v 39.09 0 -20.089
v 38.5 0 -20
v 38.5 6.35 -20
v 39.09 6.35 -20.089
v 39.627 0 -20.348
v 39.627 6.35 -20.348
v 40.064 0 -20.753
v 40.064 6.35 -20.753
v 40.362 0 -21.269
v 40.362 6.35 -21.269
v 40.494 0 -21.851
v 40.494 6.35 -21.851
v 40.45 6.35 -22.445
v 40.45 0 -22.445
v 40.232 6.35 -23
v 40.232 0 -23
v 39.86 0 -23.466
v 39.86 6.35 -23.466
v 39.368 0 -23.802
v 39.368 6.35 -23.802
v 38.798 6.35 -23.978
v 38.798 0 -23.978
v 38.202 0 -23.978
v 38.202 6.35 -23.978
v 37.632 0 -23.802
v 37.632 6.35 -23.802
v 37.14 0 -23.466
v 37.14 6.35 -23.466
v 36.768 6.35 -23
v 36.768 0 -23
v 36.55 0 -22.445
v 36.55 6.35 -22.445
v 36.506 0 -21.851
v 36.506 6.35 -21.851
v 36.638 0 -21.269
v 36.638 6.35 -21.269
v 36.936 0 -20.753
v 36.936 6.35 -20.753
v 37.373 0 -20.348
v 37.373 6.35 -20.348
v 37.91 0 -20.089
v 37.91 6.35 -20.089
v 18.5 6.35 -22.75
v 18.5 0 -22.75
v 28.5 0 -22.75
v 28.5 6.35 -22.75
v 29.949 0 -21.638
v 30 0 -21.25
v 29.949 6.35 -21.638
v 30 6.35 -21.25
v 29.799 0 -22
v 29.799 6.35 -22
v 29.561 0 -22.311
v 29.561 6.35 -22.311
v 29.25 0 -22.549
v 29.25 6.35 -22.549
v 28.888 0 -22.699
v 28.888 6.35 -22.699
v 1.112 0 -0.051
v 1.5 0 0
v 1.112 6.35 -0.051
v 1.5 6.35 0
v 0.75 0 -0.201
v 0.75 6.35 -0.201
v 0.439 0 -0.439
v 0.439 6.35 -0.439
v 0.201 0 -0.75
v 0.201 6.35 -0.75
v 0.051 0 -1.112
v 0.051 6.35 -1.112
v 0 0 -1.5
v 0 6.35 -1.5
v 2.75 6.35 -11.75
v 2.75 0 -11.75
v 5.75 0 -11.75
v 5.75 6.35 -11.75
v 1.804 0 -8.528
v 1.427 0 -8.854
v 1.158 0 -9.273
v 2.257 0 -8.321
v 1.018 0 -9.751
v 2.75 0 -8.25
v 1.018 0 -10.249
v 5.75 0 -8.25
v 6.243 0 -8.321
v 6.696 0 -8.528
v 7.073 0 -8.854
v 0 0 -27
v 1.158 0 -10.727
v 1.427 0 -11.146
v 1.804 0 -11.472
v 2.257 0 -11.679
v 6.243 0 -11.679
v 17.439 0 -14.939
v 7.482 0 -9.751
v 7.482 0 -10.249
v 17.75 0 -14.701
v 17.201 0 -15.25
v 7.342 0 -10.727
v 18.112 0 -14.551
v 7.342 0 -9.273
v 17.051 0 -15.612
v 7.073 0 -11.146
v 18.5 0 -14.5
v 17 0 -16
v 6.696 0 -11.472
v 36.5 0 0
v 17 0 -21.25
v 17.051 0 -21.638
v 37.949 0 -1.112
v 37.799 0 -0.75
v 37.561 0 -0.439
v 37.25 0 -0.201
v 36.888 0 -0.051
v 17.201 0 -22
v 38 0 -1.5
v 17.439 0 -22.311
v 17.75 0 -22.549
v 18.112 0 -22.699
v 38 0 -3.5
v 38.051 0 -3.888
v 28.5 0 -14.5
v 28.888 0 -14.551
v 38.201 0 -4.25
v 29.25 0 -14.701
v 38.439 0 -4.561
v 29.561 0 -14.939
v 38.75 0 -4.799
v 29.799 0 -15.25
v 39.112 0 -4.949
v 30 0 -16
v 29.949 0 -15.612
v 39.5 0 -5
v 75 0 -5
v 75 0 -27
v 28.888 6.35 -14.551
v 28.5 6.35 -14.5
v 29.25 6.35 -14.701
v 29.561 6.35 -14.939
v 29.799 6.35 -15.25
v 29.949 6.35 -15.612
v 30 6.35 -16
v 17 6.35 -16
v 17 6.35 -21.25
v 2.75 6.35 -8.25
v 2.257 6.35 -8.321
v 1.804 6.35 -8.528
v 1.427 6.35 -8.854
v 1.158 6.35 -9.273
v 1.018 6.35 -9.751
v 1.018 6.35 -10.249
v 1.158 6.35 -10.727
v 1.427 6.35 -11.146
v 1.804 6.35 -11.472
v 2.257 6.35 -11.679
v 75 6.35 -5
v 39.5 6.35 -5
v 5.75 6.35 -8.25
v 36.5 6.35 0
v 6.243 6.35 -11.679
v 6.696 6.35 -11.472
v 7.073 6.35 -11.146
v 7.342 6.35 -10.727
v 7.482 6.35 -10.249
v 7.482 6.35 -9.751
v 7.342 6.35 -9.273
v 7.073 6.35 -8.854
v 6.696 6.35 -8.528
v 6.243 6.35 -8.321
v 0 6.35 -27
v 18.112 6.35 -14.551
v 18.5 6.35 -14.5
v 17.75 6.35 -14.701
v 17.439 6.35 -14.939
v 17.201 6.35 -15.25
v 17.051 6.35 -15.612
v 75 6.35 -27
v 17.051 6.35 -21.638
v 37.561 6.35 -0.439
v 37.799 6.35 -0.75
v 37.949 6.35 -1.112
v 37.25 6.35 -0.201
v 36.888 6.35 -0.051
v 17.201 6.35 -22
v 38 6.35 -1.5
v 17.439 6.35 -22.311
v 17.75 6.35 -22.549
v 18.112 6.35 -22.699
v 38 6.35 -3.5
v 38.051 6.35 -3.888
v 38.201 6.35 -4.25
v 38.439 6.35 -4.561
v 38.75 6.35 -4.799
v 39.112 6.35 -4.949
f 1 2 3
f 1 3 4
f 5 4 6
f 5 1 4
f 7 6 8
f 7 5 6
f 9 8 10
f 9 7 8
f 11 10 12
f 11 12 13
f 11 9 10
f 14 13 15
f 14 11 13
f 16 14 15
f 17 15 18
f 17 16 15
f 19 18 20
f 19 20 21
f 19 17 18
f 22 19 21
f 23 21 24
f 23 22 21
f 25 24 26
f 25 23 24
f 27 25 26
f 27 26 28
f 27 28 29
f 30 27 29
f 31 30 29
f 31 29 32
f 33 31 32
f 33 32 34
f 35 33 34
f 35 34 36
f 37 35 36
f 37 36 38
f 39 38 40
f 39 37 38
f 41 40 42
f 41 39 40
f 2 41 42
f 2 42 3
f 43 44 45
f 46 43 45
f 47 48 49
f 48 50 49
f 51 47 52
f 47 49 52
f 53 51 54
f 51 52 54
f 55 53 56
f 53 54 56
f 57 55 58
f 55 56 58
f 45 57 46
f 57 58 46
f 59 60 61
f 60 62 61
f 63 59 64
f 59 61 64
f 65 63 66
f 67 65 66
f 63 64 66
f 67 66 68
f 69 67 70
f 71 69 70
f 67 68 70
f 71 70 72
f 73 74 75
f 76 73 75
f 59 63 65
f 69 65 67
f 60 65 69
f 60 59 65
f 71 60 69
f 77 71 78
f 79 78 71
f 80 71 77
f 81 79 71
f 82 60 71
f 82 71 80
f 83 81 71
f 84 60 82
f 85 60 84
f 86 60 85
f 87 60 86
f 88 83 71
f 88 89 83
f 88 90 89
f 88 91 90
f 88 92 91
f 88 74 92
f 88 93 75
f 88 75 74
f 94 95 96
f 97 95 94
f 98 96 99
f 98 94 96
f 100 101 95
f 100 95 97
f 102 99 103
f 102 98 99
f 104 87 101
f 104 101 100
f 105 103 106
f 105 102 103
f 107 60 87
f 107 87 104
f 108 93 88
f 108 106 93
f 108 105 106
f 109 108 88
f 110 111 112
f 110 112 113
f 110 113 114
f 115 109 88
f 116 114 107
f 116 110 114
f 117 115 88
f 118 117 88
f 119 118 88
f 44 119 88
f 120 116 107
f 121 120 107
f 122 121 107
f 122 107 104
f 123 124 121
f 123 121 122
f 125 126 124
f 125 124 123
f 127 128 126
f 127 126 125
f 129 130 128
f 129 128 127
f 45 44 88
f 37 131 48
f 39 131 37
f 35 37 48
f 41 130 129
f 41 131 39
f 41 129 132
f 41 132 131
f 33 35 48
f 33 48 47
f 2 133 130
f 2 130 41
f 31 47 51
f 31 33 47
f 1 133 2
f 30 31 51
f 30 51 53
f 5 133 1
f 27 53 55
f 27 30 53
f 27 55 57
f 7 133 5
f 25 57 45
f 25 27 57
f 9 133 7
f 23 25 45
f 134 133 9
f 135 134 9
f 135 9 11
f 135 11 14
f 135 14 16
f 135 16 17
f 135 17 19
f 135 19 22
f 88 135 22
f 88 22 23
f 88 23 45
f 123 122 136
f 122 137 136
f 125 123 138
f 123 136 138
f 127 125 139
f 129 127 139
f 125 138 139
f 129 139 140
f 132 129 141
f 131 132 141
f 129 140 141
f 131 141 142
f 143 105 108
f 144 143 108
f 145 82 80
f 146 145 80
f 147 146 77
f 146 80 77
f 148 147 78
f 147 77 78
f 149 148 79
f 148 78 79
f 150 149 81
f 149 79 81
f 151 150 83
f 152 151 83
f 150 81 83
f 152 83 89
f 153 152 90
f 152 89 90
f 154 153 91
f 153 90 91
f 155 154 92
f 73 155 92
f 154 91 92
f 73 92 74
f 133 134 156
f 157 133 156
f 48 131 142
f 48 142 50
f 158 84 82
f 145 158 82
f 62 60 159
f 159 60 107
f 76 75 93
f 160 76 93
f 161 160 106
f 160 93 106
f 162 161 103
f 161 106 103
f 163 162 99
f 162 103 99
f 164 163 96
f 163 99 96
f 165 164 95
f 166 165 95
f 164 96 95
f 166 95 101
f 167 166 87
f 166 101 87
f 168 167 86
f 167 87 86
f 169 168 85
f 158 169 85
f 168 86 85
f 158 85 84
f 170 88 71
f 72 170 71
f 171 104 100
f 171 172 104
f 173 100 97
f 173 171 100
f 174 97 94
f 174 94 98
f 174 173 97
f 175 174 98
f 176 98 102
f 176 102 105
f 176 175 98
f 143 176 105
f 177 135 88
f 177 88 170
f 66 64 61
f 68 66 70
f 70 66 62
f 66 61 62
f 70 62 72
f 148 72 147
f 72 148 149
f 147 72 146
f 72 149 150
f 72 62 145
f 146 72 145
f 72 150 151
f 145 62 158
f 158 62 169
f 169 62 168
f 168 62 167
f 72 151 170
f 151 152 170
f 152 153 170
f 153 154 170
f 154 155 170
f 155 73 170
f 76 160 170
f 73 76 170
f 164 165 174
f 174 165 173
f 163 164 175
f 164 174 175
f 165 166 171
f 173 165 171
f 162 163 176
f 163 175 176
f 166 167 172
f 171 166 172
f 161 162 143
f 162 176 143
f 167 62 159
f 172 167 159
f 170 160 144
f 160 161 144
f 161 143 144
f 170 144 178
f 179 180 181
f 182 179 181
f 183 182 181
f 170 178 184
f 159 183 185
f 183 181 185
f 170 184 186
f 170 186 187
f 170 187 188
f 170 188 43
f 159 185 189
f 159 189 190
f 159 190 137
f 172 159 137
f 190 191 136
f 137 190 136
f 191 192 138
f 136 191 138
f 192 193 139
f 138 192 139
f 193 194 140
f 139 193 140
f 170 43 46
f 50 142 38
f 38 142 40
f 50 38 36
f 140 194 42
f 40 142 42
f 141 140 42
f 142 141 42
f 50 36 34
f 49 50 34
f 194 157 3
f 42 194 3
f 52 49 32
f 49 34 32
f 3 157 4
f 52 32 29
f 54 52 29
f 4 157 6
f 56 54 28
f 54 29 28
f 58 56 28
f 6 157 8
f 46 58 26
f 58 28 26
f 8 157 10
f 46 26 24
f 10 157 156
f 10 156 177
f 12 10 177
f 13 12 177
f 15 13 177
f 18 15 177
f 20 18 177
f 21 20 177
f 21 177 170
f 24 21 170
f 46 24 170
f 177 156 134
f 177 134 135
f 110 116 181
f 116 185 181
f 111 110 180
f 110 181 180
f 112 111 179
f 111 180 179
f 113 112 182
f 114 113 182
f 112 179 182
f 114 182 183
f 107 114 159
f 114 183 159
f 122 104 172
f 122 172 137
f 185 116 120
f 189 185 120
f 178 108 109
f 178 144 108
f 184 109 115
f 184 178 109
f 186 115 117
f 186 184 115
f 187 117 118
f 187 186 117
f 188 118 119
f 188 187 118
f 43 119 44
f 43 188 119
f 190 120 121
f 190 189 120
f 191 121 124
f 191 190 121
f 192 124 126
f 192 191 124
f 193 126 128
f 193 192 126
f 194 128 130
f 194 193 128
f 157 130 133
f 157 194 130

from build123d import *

# Parameters (mm, degrees)
SKETCH1_R           = 2
SKETCH1_R_2         = 3
SKETCH1_W           = 13
SKETCH1_H           = 8.25
BOSS_EXTRUDE1_DEPTH = 6.35
FILLET1_R           = 1.5
SKETCH2_W           = 82.327825706
SKETCH2_H           = 14.458254131
CUT_EXTRUDE1_DEPTH  = 51
SKETCH3_W           = 51.5
SKETCH3_H           = 6.35
BOSS_EXTRUDE2_DEPTH = 25
SKETCH4_W           = 84.929028447
SKETCH4_H           = 25.885902506
CUT_EXTRUDE2_DEPTH  = 90
SKETCH5_W           = 0.1
SKETCH5_H           = 6.35
CUT_EXTRUDE3_DEPTH  = 90
SKETCH6_W           = 81.24526446
SKETCH6_H           = 21.013173112
CUT_EXTRUDE4_DEPTH  = 71


with BuildPart() as part:
    # Sketch1 → Boss-Extrude1 (new body)
    with BuildSketch(Plane(origin=(0, 0, 0), x_dir=(1, 0, 0), z_dir=(0, 1, 0))):
        Polygon((38, 0), (38, 5), (58, 5), (58, 0), (96, 0), (96, 48.5), (89, 58.5), (89, 67.5), (62, 67.5), (62, 56.5), (34, 56.5), (34, 67.5), (7, 67.5), (7, 58.5), (0, 48.5), (0, 0), align=None)
        with Locations(Location((38.5, 40, 0), (0, 0, 270))):
            Circle(SKETCH1_R, mode=Mode.SUBTRACT)
        with Locations(Location((38.5, 22, 0), (0, 0, 270))):
            Circle(SKETCH1_R, mode=Mode.SUBTRACT)
        with Locations(Location((57.5, 22, 0), (0, 0, 90))):
            Circle(SKETCH1_R, mode=Mode.SUBTRACT)
        with Locations(Location((57.5, 40, 0), (0, 0, 90))):
            Circle(SKETCH1_R, mode=Mode.SUBTRACT)
        with Locations(Location((12.5, 61.75, 0), (0, 0, 270))):
            Circle(SKETCH1_R_2, mode=Mode.SUBTRACT)
        with Locations(Location((28, 61.75, 0), (0, 0, 270))):
            Circle(SKETCH1_R_2, mode=Mode.SUBTRACT)
        with Locations(Location((68, 61.75, 0), (0, 0, 90))):
            Circle(SKETCH1_R_2, mode=Mode.SUBTRACT)
        with Locations(Location((83.5, 61.75, 0), (0, 0, 90))):
            Circle(SKETCH1_R_2, mode=Mode.SUBTRACT)
        with Locations((72.5, 18.625)):
            Rectangle(SKETCH1_W, SKETCH1_H, mode=Mode.SUBTRACT)
        with Locations((23.5, 34.875)):
            Rectangle(SKETCH1_W, SKETCH1_H, mode=Mode.SUBTRACT)
        with Locations((23.5, 18.625)):
            Rectangle(SKETCH1_W, SKETCH1_H, mode=Mode.SUBTRACT)
        with Locations((72.5, 34.875)):
            Rectangle(SKETCH1_W, SKETCH1_H, mode=Mode.SUBTRACT)
        with BuildLine():
            Line((2.75, 11.75), (5.75, 11.75))
            ThreePointArc((5.75, 11.75), (7.5, 10), (5.75, 8.25))
            Line((5.75, 8.25), (2.75, 8.25))
            ThreePointArc((2.75, 8.25), (1, 10), (2.75, 11.75))
        make_face(mode=Mode.SUBTRACT)
        with BuildLine():
            Line((93.25, 8.25), (90.25, 8.25))
            ThreePointArc((90.25, 8.25), (88.5, 10), (90.25, 11.75))
            Line((90.25, 11.75), (93.25, 11.75))
            ThreePointArc((93.25, 11.75), (95, 10), (93.25, 8.25))
        make_face(mode=Mode.SUBTRACT)
        with BuildLine():
            Line((93.25, 45.5), (90.25, 45.5))
            ThreePointArc((90.25, 45.5), (88.5, 47.25), (90.25, 49))
            Line((90.25, 49), (93.25, 49))
            ThreePointArc((93.25, 49), (95, 47.25), (93.25, 45.5))
        make_face(mode=Mode.SUBTRACT)
        with BuildLine():
            Line((2.75, 49), (5.75, 49))
            ThreePointArc((5.75, 49), (7.5, 47.25), (5.75, 45.5))
            Line((5.75, 45.5), (2.75, 45.5))
            ThreePointArc((2.75, 45.5), (1, 47.25), (2.75, 49))
        make_face(mode=Mode.SUBTRACT)
    extrude(amount=BOSS_EXTRUDE1_DEPTH)

    # Fillet1
    fillet1_edges = [part.edges().sort_by_distance(p)[0] for p in [
        (0, 3.175, -48.5),
        (7, 3.175, -58.5),
        (7, 3.175, -67.5),
        (34, 3.175, -67.5),
        (34, 3.175, -56.5),
        (62, 3.175, -56.5),
        (62, 3.175, -67.5),
        (89, 3.175, -67.5),
        (89, 3.175, -58.5),
        (96, 3.175, -48.5),
        (96, 3.175, 0),
        (58, 3.175, 0),
        (58, 3.175, -5),
        (38, 3.175, -5),
        (38, 3.175, 0),
        (0, 3.175, 0),
        (17, 3.175, -39),
        (17, 3.175, -30.75),
        (30, 3.175, -30.75),
        (30, 3.175, -39),
        (17, 3.175, -22.75),
        (17, 3.175, -14.5),
        (30, 3.175, -14.5),
        (30, 3.175, -22.75),
        (79, 3.175, -14.5),
        (79, 3.175, -22.75),
        (66, 3.175, -22.75),
        (66, 3.175, -14.5),
        (79, 3.175, -30.75),
        (79, 3.175, -39),
        (66, 3.175, -39),
        (66, 3.175, -30.75),
    ]]
    fillet(fillet1_edges, radius=FILLET1_R)

    # Sketch2 → Cut-Extrude1 (cut)
    with BuildSketch(Plane(origin=(48, 0, 0), x_dir=(0, 0, -1), z_dir=(1, 0, 0))):
        with Locations((33.293792952, 1.315835649)):
            Rectangle(SKETCH2_W, SKETCH2_H)
    extrude(amount=CUT_EXTRUDE1_DEPTH, mode=Mode.SUBTRACT)

    # Sketch3 → Boss-Extrude2 (add)
    with BuildSketch(Plane(origin=(48, 0, 0), x_dir=(0, 0, -1), z_dir=(1, 0, 0))):
        with Locations((30.75, 3.175)):
            Rectangle(SKETCH3_W, SKETCH3_H)
    extrude(amount=BOSS_EXTRUDE2_DEPTH)

    # Mirror1: part across plane


with BuildPart() as part_1:
    add(part.part)
    add(part.part.mirror(Plane(origin=(73, 0, 0), x_dir=(0, 0, 1), z_dir=(1, 0, 0))))

    # Sketch4 → Cut-Extrude2 (cut)
    with BuildSketch(Plane(origin=(75, 0, 0), x_dir=(0, 0, -1), z_dir=(1, 0, 0))):
        with Locations((34.029781947, 1.13903014)):
            Rectangle(SKETCH4_W, SKETCH4_H)
    extrude(amount=CUT_EXTRUDE2_DEPTH, mode=Mode.SUBTRACT)

    # Sketch5 → Cut-Extrude3 (cut)
    with BuildSketch(Plane(origin=(75, 0, 0), x_dir=(0, 0, -1), z_dir=(1, 0, 0))):
        with Locations((27.05, 3.175)):
            Rectangle(SKETCH5_W, SKETCH5_H)
    extrude(amount=-CUT_EXTRUDE3_DEPTH, mode=Mode.SUBTRACT)


with BuildPart() as cut_extrude3_piece_1:
    # of the separate pieces the step leaves, piece 1, a body of its own (cut_extrude3_pieces)
    add(part_1.part.solids().sort_by_distance((0, 0, -48.027166654))[0])

    # Sketch6 → Cut-Extrude4 (cut)
    with BuildSketch(Plane(origin=(0, 0, -27), x_dir=(-1, 0, 0), z_dir=(0, 0, -1))):
        with Locations((-35.926138856, 1.728749219)):
            Rectangle(SKETCH6_W, SKETCH6_H)
    extrude(amount=CUT_EXTRUDE4_DEPTH, mode=Mode.SUBTRACT)


with BuildPart() as cut_extrude3_piece_2:
    # of the separate pieces the step leaves, piece 2, a body of its own (cut_extrude3_pieces)
    add(part_1.part.solids().sort_by_distance((38, 0, -1.5))[0])


solid = cut_extrude3_piece_2.part
